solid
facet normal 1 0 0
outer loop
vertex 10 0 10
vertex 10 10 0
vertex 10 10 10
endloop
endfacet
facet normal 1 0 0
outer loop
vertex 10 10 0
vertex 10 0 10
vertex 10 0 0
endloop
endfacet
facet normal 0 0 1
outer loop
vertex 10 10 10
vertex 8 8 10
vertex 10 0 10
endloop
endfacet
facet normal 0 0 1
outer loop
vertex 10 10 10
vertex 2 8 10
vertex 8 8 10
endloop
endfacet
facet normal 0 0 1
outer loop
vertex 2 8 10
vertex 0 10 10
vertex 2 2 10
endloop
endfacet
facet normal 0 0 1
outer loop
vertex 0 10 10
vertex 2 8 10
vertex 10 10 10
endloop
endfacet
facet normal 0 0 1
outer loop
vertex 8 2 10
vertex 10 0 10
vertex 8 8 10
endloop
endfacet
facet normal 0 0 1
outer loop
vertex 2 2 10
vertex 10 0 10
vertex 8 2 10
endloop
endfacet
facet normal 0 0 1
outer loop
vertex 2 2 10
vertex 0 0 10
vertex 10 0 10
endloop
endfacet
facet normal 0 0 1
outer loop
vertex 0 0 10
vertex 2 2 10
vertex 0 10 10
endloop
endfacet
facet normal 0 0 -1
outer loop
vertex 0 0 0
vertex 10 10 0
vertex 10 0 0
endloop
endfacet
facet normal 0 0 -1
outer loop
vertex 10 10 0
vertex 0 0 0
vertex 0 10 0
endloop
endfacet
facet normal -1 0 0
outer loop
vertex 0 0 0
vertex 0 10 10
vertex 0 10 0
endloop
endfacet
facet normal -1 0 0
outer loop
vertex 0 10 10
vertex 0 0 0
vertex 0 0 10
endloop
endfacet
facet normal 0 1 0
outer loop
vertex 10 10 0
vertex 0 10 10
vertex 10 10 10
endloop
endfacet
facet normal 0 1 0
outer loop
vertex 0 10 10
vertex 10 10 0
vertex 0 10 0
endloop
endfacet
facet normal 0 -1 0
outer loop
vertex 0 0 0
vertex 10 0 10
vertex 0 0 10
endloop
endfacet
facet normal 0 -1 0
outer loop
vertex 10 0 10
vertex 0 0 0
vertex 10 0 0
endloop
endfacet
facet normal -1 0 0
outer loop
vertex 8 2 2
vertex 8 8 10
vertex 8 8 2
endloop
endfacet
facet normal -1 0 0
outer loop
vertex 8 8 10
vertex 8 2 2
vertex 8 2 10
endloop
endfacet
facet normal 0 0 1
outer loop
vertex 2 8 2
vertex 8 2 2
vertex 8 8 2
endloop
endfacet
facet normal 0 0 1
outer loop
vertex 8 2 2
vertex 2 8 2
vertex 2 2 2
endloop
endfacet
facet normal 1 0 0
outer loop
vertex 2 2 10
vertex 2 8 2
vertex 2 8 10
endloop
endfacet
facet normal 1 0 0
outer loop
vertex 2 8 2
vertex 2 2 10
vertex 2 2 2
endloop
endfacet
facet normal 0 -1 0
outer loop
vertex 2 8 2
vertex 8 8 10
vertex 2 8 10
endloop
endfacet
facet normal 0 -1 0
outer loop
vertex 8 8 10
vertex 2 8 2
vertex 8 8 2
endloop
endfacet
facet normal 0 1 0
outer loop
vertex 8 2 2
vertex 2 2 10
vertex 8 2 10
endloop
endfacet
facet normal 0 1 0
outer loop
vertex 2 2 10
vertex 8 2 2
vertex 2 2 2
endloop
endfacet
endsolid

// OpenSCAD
// Minimal integration fixture: a hollow 10mm box.
// The boolean operation makes OpenSCAD evaluate real geometry, so the summary
// carries the manifold `simple` flag rather than plain PolySet statistics.
size = 10;  // [5:50] Outer edge in mm
wall = 2;   // [1:0.5:5] Wall thickness in mm

difference() {
  cube([size, size, size]);
  translate([wall, wall, wall])
    cube([size - 2 * wall, size - 2 * wall, size]);
}
